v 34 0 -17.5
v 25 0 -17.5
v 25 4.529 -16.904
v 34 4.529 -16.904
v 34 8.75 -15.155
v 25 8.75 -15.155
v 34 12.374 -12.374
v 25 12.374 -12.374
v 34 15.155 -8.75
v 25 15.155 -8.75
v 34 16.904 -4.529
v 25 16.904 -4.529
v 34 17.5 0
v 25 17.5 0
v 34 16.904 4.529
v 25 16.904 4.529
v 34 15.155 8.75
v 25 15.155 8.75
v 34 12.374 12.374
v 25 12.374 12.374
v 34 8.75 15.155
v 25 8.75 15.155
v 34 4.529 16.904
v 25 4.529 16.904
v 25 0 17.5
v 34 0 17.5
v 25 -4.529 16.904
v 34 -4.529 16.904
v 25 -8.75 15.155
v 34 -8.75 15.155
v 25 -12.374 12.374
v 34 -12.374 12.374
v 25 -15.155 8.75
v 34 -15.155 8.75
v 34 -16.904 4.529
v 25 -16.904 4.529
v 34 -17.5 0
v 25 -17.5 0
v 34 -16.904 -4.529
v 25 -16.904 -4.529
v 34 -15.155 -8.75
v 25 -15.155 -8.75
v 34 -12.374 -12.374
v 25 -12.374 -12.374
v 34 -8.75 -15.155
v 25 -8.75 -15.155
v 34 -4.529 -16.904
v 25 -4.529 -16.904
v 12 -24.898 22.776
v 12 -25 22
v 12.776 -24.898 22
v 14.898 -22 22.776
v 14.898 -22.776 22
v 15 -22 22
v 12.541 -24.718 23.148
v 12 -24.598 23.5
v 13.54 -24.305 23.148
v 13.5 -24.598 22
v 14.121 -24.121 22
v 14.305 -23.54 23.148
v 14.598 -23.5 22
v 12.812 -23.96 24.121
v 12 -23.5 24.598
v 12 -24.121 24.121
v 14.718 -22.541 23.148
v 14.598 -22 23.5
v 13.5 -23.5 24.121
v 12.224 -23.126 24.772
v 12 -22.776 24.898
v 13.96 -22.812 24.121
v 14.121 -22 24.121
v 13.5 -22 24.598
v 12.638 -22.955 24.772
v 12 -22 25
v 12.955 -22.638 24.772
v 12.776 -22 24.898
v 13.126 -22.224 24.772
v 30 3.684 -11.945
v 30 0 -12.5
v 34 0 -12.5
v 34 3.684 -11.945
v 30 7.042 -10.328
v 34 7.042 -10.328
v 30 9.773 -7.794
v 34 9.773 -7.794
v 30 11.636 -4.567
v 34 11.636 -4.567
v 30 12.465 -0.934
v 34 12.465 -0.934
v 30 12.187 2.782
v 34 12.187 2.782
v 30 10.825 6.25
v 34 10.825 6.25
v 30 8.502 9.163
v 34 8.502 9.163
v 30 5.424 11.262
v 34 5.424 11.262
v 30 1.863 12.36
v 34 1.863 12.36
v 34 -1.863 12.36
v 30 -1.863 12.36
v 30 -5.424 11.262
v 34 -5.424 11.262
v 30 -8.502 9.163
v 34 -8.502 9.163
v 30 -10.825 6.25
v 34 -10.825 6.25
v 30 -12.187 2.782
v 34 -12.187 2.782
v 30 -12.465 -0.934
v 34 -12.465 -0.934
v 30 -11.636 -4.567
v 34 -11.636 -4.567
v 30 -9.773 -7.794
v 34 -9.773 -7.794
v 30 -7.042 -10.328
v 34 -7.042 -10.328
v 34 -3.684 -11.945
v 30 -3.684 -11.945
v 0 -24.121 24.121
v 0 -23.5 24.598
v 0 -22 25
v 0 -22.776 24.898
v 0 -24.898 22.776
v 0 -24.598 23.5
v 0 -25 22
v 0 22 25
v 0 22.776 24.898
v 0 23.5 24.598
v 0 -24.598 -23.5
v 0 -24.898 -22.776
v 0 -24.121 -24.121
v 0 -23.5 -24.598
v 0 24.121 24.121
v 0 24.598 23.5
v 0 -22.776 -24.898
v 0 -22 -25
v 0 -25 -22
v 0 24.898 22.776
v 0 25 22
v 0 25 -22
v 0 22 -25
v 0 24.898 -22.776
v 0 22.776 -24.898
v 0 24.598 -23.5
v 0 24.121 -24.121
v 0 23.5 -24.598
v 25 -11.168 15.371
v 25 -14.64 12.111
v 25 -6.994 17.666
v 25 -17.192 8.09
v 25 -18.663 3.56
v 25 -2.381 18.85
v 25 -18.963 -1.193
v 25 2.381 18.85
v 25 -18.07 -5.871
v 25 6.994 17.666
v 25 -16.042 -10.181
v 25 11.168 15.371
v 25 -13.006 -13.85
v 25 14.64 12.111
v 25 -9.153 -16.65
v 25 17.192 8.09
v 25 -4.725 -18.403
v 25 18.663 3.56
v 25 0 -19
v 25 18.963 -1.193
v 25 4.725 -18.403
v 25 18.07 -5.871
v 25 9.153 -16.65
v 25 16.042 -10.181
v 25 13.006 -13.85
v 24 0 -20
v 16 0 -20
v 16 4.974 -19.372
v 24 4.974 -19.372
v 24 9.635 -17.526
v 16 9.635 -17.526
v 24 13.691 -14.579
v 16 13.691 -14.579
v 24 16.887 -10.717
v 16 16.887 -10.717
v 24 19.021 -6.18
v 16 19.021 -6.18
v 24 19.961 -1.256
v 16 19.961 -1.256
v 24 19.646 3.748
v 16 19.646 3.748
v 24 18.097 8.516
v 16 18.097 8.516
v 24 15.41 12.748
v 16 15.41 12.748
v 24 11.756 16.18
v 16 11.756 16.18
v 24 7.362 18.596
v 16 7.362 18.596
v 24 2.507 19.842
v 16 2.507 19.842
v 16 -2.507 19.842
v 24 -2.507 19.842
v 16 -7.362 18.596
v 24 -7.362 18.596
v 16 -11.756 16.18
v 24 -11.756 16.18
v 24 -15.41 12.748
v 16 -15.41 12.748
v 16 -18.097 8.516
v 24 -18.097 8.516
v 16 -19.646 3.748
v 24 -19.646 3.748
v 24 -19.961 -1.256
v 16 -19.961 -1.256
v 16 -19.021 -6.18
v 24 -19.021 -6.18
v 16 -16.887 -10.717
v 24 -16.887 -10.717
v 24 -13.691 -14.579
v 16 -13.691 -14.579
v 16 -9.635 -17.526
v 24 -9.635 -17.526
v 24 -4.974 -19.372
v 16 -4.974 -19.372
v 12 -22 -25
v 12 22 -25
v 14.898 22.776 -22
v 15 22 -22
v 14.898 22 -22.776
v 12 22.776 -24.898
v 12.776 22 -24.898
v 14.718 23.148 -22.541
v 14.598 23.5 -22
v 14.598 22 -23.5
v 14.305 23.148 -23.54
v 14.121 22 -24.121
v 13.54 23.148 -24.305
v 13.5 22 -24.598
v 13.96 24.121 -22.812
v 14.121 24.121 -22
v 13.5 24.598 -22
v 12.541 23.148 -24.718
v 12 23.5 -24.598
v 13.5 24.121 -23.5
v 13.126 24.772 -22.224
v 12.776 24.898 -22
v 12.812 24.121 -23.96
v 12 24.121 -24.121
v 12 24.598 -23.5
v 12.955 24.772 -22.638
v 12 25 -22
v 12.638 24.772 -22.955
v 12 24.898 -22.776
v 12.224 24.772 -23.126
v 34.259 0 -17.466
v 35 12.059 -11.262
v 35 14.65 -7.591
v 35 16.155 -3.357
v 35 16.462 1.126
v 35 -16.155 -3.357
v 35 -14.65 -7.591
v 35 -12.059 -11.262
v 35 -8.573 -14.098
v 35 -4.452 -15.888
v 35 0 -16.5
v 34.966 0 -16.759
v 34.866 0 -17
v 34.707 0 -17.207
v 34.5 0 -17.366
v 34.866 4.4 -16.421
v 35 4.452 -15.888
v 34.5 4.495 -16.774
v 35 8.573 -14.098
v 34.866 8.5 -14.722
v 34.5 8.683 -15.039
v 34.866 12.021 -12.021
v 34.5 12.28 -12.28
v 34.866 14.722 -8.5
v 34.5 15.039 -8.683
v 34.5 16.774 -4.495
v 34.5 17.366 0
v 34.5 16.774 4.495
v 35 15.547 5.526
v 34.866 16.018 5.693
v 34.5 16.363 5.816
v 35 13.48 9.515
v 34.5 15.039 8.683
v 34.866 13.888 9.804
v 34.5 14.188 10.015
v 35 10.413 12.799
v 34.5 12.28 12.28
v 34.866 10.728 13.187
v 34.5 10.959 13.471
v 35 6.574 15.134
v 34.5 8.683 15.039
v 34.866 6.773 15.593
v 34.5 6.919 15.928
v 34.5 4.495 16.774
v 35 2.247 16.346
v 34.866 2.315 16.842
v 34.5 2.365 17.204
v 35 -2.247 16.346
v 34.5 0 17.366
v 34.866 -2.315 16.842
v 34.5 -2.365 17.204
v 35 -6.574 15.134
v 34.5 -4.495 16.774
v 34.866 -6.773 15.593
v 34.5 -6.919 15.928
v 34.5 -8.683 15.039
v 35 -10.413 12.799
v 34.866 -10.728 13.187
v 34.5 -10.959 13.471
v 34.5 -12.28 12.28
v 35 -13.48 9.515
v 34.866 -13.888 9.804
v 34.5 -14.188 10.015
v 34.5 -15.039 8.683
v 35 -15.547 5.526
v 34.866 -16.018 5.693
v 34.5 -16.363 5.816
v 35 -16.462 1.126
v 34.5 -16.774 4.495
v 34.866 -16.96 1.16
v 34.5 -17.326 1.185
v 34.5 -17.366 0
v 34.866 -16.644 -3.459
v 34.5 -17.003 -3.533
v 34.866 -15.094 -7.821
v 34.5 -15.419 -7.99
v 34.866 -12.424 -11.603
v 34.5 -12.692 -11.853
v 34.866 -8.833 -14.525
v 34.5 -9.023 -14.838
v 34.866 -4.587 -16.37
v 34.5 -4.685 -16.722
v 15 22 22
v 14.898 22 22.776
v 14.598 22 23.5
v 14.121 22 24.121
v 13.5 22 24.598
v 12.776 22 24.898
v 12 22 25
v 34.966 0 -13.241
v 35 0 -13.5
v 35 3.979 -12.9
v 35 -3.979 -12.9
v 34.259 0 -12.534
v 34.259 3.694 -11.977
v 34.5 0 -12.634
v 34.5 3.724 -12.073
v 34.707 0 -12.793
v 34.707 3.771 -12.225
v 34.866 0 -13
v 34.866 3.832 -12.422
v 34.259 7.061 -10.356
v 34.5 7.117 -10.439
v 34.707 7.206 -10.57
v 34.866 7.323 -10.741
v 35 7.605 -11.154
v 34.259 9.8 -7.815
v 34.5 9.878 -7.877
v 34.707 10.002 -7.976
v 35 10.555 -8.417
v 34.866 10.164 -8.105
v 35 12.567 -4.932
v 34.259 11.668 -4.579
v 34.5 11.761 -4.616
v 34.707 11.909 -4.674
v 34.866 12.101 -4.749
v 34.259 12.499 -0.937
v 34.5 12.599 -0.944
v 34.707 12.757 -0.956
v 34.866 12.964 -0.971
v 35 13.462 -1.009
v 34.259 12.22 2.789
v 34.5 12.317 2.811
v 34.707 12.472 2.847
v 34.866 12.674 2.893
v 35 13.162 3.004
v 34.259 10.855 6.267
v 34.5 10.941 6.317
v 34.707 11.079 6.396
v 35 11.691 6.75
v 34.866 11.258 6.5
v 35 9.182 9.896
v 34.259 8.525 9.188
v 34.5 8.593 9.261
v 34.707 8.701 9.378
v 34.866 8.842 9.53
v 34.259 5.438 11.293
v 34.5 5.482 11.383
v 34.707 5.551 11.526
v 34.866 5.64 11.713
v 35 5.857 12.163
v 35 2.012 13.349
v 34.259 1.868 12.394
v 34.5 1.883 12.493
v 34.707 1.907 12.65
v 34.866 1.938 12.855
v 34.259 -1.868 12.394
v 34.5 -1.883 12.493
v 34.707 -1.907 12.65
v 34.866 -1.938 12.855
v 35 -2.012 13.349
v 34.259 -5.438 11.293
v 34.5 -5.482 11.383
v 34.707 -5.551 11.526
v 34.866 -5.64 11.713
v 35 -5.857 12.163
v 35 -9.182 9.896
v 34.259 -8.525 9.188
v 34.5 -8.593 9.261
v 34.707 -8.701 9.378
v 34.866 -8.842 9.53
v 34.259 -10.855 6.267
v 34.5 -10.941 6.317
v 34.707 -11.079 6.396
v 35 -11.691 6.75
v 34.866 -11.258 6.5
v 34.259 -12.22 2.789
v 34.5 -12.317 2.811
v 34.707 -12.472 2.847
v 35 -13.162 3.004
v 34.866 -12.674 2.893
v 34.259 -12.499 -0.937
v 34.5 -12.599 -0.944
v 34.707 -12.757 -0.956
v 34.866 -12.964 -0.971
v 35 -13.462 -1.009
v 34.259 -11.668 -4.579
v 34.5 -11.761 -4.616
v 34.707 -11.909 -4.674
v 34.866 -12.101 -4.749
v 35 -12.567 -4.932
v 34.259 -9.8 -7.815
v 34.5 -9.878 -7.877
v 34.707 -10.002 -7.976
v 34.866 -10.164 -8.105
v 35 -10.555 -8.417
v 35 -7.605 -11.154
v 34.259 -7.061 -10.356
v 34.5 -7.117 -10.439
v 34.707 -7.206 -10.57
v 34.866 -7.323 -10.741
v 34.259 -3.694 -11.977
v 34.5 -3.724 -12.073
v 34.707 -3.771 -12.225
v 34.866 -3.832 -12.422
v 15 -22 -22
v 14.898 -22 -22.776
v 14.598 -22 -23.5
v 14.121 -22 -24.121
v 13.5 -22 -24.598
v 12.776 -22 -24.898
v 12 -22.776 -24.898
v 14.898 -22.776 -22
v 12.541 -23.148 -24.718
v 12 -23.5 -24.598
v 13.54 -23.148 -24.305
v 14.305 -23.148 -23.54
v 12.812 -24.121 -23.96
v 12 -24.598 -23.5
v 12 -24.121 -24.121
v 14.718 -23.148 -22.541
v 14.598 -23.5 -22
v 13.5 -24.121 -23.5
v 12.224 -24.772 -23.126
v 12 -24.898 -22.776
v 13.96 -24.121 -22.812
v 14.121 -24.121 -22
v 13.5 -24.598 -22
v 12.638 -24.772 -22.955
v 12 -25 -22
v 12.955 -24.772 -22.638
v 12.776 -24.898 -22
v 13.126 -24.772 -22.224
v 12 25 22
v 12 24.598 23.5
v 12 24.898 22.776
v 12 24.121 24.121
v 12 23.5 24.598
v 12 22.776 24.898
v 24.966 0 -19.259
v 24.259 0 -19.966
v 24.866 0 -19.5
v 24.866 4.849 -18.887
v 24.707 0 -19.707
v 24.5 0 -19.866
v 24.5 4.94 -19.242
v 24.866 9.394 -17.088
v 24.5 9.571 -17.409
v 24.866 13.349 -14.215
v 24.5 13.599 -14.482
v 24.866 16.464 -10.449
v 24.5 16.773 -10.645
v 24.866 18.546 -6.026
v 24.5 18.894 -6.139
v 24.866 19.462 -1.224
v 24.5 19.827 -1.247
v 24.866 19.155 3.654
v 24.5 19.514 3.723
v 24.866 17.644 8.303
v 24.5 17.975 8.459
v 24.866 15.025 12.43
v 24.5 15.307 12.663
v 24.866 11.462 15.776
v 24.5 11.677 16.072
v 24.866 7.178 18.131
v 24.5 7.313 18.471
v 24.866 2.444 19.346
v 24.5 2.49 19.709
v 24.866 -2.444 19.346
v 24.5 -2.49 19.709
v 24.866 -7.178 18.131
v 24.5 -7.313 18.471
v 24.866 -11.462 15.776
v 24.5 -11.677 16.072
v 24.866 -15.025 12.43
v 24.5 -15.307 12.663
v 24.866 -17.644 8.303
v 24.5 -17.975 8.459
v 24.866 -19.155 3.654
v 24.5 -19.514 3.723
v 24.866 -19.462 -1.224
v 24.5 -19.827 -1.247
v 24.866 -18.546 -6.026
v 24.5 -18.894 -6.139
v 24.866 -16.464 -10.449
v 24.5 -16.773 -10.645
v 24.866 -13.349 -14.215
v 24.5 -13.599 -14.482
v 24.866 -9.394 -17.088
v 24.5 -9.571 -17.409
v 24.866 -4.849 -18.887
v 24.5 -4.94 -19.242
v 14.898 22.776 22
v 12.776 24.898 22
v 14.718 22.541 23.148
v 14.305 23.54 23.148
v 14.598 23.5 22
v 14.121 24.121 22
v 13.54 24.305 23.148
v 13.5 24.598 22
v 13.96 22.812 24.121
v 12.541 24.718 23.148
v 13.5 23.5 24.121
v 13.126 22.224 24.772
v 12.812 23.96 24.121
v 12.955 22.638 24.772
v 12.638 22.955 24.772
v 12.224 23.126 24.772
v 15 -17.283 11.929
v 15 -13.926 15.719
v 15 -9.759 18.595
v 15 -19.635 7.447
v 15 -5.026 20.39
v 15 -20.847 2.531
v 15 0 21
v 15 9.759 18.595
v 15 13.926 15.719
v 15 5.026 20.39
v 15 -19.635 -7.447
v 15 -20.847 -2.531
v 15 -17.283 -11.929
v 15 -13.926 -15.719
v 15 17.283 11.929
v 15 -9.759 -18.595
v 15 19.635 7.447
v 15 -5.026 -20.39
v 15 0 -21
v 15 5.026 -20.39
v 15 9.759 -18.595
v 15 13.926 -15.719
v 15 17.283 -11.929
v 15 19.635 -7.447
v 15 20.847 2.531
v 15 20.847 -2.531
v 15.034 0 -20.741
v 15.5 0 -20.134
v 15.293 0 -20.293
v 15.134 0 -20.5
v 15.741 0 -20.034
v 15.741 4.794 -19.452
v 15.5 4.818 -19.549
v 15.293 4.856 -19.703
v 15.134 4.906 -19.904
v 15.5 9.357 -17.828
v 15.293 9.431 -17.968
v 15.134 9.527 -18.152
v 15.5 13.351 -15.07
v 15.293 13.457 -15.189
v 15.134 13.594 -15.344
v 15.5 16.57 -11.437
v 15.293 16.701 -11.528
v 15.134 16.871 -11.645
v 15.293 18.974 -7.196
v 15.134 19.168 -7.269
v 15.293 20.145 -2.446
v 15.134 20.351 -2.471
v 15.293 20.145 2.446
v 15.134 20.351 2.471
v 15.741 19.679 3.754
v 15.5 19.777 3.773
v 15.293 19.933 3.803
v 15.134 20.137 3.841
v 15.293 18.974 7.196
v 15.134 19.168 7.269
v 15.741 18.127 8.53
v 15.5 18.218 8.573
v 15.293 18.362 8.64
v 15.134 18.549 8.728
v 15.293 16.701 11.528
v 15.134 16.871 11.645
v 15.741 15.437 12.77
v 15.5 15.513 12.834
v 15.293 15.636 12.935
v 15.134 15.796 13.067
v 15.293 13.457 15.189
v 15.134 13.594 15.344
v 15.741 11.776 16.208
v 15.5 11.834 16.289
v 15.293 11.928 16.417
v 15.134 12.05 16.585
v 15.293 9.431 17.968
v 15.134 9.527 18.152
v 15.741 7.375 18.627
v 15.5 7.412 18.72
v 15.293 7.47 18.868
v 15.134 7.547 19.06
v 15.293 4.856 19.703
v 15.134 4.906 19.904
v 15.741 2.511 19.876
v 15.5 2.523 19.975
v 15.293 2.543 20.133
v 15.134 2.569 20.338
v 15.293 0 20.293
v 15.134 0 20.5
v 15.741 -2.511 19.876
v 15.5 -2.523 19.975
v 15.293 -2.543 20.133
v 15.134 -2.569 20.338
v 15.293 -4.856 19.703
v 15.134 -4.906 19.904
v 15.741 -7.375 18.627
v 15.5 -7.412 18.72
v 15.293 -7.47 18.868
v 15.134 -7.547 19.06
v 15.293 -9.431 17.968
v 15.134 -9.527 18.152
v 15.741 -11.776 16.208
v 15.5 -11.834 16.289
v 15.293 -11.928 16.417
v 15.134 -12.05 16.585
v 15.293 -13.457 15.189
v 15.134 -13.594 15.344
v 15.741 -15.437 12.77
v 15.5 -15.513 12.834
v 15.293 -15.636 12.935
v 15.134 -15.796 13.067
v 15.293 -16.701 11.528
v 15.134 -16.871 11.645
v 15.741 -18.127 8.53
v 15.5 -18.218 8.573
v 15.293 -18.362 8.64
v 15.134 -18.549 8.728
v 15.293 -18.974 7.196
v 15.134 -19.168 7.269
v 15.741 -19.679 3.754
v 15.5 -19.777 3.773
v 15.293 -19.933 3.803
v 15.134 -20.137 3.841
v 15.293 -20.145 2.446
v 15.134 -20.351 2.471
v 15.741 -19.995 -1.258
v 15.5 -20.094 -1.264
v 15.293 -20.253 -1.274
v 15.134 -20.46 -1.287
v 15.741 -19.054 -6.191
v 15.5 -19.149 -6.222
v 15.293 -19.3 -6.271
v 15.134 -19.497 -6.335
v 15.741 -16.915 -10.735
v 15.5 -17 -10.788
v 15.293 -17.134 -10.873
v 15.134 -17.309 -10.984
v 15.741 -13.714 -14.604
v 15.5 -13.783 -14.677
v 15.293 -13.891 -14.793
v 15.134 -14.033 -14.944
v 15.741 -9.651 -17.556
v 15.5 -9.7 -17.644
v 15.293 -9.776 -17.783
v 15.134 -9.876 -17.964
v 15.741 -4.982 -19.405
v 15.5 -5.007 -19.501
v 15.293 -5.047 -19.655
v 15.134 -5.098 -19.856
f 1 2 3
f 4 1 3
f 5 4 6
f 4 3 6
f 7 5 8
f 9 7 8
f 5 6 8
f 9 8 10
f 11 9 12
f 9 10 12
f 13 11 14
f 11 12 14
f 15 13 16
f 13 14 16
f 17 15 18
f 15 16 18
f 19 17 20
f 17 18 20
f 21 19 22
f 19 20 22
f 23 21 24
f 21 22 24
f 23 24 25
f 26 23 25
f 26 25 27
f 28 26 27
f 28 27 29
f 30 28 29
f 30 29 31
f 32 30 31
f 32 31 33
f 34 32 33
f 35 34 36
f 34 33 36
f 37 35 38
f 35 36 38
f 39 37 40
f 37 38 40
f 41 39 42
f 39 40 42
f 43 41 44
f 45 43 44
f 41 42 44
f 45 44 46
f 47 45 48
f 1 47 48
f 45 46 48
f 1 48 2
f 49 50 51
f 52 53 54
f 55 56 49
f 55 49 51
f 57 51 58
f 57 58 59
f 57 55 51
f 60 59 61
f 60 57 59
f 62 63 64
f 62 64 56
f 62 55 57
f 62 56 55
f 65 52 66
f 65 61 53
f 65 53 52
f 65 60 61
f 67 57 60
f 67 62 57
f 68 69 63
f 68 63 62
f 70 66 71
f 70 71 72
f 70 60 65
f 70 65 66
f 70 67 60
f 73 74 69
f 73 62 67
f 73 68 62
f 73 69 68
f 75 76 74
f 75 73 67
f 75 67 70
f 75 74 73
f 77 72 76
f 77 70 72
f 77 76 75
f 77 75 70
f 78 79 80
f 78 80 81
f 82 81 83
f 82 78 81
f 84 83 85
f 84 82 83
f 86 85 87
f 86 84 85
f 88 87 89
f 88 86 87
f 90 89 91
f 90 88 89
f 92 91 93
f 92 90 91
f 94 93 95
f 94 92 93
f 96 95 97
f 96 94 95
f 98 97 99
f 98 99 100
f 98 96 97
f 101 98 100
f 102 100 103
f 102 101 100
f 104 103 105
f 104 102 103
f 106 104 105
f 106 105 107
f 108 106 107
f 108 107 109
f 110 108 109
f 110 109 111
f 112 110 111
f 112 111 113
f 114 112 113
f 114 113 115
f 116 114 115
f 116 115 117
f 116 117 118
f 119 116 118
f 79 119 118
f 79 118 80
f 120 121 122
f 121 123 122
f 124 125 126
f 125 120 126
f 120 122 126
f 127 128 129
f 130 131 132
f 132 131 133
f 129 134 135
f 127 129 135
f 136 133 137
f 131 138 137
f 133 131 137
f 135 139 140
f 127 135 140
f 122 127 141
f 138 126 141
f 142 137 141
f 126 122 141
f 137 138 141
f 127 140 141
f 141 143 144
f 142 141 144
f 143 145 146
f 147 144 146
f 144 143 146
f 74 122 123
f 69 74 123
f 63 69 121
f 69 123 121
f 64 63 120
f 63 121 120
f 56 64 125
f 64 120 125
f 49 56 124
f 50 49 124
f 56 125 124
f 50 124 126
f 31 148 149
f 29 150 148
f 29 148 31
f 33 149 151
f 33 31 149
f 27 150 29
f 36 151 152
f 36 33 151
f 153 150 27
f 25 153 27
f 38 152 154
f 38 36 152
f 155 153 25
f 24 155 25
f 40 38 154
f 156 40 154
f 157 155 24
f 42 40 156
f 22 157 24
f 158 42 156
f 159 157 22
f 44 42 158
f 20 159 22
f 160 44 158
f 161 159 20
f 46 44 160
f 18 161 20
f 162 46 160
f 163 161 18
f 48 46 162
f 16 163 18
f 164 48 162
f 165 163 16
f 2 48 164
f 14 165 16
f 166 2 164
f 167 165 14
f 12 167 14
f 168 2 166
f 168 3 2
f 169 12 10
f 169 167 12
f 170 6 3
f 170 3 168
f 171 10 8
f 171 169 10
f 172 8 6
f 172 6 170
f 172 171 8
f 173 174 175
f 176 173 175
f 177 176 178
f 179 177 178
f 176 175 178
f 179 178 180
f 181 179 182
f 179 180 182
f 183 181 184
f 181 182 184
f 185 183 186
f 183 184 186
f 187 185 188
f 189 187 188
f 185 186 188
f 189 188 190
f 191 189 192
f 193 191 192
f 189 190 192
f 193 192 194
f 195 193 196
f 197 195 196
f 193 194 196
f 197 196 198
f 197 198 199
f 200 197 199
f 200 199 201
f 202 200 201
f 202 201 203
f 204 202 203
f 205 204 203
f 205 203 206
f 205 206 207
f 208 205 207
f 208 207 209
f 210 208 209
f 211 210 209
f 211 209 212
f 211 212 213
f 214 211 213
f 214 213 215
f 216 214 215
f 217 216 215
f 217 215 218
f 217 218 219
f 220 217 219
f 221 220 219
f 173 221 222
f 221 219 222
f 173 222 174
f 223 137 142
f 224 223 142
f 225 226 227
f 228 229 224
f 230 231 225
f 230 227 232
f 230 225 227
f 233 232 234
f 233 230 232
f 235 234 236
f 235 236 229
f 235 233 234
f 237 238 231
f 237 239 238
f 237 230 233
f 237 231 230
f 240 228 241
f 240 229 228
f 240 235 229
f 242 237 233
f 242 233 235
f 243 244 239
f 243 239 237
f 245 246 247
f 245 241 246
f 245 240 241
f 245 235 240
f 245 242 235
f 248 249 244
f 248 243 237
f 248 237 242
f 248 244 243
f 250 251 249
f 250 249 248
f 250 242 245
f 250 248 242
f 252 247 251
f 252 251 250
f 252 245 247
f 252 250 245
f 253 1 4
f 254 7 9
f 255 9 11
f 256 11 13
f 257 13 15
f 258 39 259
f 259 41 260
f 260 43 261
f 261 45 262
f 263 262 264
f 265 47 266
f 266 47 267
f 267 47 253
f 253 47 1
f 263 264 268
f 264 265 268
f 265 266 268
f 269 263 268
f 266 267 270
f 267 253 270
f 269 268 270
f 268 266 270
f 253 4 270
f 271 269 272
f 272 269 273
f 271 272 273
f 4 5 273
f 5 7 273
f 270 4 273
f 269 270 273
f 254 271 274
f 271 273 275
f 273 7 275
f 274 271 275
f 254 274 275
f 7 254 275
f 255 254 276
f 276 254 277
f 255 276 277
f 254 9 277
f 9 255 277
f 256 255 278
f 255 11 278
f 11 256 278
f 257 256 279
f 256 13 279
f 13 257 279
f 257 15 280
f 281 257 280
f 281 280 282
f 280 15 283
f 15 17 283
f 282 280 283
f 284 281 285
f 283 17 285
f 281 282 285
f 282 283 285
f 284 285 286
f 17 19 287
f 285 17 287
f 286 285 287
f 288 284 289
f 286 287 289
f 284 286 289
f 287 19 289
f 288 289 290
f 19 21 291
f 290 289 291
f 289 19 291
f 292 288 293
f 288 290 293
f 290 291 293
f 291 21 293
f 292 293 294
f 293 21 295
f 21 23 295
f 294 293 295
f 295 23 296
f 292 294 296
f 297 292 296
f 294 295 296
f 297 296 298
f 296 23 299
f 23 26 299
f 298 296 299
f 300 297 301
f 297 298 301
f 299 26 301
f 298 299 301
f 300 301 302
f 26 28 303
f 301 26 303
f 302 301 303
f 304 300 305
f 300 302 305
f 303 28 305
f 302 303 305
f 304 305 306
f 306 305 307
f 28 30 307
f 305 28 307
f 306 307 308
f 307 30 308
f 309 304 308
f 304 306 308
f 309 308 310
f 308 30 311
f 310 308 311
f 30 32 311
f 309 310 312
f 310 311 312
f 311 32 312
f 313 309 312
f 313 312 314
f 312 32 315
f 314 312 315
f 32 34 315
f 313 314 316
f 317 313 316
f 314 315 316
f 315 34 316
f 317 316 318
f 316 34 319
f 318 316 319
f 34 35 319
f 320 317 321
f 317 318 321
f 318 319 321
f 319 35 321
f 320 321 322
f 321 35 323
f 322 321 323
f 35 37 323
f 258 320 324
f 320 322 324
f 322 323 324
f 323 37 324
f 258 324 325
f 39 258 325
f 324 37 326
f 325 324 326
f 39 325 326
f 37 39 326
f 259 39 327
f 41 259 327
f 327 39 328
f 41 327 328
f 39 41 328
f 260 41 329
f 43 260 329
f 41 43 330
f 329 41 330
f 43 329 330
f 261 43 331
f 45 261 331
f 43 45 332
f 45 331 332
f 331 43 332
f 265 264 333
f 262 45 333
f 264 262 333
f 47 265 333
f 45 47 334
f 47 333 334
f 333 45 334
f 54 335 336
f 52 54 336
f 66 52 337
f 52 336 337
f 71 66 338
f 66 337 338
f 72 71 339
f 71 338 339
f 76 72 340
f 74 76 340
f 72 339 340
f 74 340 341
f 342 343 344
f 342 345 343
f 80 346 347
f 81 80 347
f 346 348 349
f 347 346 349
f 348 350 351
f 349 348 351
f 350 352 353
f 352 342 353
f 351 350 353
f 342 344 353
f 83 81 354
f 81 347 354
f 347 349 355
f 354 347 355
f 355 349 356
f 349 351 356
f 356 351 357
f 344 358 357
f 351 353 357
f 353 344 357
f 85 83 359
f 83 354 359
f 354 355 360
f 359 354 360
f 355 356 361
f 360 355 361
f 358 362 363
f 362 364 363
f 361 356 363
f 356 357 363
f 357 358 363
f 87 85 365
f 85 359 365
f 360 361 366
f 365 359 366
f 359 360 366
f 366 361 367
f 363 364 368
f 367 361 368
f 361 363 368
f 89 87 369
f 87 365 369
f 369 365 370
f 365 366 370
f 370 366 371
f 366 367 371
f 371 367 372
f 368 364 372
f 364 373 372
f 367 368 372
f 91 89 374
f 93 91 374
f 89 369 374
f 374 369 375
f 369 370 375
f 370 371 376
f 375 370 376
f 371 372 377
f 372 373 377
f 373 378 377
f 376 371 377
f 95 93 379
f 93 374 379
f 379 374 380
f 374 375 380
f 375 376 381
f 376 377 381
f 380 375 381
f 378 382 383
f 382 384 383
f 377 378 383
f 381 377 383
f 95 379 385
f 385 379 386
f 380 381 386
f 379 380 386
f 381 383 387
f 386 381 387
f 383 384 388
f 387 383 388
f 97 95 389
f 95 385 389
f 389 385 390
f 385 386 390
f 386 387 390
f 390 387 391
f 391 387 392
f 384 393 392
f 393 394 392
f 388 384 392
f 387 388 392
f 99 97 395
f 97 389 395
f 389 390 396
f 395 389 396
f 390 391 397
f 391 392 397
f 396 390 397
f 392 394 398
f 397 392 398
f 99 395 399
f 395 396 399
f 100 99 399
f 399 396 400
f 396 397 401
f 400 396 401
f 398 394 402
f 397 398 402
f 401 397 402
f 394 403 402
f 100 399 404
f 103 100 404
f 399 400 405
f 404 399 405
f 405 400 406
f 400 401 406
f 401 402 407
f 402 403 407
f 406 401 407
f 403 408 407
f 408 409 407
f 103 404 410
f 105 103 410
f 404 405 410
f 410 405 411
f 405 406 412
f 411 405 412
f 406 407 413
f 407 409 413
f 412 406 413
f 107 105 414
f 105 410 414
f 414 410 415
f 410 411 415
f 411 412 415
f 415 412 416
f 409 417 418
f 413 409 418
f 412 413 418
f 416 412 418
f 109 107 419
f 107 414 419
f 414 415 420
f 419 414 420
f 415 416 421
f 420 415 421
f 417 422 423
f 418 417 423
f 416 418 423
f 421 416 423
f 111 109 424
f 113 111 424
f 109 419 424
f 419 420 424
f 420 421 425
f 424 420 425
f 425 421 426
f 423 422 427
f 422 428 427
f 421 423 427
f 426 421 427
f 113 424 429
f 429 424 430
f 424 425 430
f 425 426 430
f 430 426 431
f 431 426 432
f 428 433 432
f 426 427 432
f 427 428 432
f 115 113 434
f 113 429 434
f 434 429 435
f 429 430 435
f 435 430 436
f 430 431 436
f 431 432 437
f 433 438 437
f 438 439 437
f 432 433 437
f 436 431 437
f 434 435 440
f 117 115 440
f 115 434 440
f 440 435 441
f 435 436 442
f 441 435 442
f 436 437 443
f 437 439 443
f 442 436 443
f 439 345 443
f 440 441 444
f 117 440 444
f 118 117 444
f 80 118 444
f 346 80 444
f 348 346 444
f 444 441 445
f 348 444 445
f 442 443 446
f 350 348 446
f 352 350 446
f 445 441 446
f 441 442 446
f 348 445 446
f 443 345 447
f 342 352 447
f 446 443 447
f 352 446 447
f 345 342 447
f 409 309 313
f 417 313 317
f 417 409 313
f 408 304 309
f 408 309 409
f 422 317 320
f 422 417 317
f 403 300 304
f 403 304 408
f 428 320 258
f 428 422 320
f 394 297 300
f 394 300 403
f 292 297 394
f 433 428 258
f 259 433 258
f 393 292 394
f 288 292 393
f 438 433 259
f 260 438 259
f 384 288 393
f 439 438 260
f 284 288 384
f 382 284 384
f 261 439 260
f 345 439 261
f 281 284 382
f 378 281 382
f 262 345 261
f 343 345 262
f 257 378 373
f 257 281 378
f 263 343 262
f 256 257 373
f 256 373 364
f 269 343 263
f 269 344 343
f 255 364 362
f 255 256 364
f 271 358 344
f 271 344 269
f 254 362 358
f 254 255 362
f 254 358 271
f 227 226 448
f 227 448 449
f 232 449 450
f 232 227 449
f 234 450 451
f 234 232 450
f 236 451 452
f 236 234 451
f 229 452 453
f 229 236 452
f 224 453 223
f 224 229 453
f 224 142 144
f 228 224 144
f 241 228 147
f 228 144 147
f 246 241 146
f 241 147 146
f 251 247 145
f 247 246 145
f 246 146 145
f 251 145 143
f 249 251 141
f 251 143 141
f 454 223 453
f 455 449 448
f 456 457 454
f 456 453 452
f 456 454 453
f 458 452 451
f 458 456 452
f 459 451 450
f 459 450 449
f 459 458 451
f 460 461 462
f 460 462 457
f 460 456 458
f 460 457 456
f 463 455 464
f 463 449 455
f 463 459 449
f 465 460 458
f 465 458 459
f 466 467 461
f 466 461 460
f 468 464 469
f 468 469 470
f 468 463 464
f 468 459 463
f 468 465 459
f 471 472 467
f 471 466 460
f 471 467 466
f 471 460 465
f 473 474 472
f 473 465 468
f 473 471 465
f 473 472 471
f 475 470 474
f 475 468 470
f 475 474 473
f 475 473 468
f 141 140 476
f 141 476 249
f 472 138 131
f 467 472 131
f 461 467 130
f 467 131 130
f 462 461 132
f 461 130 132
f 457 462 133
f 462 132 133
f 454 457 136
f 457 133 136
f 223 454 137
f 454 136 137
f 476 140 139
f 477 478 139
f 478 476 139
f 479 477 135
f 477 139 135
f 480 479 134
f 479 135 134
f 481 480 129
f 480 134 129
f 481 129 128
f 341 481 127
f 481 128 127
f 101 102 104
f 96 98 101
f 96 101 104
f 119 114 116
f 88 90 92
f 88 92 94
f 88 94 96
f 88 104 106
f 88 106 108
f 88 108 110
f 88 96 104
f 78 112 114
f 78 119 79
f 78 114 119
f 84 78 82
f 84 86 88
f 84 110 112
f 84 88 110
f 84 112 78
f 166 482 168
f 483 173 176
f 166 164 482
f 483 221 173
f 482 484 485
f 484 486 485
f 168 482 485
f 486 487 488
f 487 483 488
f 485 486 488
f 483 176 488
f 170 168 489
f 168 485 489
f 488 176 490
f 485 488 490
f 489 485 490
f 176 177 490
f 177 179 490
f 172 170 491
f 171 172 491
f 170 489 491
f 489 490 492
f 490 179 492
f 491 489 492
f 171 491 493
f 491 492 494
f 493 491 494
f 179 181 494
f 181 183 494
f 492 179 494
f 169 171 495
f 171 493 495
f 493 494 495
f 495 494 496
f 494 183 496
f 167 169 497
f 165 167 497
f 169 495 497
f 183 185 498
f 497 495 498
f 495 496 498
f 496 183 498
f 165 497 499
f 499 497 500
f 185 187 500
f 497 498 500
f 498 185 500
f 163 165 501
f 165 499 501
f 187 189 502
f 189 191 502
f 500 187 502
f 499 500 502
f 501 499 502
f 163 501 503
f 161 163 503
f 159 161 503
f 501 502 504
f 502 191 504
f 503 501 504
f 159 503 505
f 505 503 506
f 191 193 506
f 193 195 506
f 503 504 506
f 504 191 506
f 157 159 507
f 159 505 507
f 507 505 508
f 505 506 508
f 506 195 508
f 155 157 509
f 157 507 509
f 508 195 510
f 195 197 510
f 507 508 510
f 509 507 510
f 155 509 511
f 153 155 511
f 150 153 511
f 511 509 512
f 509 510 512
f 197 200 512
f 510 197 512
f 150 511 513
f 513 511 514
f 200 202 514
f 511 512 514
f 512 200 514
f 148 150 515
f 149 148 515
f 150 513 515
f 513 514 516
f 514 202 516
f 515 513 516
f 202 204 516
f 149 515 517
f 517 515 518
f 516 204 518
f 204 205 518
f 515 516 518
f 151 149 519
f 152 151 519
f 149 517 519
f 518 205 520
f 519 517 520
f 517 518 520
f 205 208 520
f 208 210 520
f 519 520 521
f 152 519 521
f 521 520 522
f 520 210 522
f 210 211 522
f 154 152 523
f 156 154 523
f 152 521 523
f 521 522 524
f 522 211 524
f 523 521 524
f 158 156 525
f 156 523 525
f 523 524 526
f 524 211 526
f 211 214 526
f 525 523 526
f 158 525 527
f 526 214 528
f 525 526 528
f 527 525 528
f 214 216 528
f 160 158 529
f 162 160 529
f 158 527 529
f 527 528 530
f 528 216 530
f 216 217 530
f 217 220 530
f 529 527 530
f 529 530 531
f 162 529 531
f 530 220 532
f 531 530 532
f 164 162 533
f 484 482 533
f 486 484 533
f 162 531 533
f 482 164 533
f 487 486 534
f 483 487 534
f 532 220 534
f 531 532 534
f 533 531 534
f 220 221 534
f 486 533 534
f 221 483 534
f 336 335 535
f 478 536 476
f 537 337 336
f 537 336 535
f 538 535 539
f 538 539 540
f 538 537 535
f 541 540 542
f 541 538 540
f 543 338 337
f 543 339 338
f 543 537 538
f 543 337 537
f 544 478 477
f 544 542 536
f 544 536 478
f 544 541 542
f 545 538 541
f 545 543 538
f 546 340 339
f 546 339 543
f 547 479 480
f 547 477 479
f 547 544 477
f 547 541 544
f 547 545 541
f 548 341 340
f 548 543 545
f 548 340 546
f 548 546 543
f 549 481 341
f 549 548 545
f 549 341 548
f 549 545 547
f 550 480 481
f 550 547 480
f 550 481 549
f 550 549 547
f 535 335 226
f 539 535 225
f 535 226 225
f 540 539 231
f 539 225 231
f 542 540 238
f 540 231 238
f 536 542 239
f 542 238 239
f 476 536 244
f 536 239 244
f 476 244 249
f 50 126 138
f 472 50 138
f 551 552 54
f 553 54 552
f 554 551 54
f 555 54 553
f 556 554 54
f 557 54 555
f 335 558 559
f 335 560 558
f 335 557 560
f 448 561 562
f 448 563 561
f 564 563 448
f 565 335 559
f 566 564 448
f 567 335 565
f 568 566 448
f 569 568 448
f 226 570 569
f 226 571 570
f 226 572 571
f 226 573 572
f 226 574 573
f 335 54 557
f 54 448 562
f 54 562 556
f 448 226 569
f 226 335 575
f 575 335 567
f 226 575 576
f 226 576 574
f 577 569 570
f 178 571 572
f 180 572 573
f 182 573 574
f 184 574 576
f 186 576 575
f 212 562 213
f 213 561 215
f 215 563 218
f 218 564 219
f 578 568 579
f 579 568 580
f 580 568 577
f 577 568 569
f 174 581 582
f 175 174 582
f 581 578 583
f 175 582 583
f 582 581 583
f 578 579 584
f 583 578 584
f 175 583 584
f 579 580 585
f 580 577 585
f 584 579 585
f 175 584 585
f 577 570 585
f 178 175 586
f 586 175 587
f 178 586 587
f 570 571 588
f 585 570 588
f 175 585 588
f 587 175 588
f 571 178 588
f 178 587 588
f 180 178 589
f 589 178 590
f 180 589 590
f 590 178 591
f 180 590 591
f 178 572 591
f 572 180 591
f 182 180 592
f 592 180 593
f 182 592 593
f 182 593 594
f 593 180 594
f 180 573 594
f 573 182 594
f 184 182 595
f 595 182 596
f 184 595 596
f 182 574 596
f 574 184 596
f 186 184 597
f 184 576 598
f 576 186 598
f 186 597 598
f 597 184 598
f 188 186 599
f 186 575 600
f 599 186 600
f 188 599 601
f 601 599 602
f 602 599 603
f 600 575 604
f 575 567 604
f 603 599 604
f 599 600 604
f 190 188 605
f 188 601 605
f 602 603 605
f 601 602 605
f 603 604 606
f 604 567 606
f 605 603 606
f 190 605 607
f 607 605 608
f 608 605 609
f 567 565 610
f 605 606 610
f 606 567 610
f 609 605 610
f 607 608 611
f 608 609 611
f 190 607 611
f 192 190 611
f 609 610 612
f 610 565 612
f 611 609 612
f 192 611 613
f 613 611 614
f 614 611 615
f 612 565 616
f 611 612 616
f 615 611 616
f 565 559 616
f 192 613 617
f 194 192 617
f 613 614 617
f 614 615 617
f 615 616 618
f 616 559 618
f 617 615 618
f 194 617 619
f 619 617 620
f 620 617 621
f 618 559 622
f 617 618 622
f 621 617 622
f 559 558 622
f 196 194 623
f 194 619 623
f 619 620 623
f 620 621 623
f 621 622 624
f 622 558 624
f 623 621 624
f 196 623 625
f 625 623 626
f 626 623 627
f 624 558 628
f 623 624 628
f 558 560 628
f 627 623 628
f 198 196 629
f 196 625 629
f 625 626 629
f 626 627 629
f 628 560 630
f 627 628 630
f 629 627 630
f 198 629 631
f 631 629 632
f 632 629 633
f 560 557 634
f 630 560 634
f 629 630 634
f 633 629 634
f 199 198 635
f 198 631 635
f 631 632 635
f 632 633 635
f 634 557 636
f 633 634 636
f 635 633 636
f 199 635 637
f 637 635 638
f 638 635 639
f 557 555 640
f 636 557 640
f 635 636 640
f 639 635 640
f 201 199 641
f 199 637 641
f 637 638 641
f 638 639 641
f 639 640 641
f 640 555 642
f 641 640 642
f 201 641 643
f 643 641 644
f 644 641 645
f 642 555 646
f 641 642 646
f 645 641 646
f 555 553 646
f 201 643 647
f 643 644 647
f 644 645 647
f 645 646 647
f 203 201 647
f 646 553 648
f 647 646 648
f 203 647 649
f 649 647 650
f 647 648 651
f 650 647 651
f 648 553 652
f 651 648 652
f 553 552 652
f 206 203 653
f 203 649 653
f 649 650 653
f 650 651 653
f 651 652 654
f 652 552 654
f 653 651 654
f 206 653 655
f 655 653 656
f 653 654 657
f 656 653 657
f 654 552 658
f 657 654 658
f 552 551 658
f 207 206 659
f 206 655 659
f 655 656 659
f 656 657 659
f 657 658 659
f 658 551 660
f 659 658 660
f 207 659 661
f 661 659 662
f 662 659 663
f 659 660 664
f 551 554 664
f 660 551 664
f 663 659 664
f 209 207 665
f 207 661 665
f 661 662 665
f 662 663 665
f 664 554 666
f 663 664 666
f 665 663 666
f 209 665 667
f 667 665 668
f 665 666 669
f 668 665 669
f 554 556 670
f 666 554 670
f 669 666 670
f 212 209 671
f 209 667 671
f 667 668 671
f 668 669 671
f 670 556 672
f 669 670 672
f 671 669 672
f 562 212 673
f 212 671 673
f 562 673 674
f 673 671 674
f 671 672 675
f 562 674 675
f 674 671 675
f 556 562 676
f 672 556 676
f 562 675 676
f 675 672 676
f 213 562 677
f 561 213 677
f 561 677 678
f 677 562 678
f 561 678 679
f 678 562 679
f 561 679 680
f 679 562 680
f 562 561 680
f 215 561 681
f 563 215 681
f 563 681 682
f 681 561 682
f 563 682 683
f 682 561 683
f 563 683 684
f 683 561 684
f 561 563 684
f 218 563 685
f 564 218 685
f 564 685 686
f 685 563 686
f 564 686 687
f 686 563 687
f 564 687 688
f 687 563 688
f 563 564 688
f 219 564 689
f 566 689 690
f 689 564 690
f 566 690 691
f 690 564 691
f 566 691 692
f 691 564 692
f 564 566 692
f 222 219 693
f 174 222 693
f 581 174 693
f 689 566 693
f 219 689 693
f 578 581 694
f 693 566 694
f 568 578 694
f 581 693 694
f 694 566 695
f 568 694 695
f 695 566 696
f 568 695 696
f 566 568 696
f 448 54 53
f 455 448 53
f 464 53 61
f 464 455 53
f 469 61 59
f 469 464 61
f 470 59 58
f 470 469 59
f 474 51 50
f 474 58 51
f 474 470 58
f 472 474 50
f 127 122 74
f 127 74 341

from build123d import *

# Parameters (mm, degrees)
SKETCH1_W           = 50
SKETCH1_H           = 50
BOSS_EXTRUDE1_DEPTH = 15
SKETCH2_R           = 20
BOSS_EXTRUDE2_DEPTH = 20
CUT_EXTRUDE1_START  = -10
SKETCH3_R           = 20
SKETCH3_R_2         = 17.5
SKETCH3_R_3         = 12.5
CUT_EXTRUDE1_DEPTH  = 10
SKETCH4_R           = 12.5
BOSS_EXTRUDE3_DEPTH = 5
FILLET1_R           = 1
FILLET2_R           = 3
FILLET3_R           = 3


with BuildPart() as part:
    # Sketch1 → Boss-Extrude1 (new body)
    with BuildSketch(Plane(origin=(0, 0, 0), x_dir=(0, 0, -1), z_dir=(1, 0, 0))):
        Rectangle(SKETCH1_W, SKETCH1_H)
    extrude(amount=BOSS_EXTRUDE1_DEPTH)

    # Sketch2 → Boss-Extrude2 (add)
    with BuildSketch(Plane(origin=(15, 0, 0), x_dir=(0, 0, -1), z_dir=(1, 0, 0))):
        Circle(SKETCH2_R)
    extrude(amount=BOSS_EXTRUDE2_DEPTH)

    # Sketch3 → Cut-Extrude1 (cut)
    # profile 1 of 2: a face of its own
    with BuildSketch(Plane(origin=(35, 0, 0), x_dir=(0, 0, -1), z_dir=(1, 0, 0)).offset(CUT_EXTRUDE1_START)):
        Circle(SKETCH3_R)
        Circle(SKETCH3_R_2, mode=Mode.SUBTRACT)
    # profile 2 of 2: a face of its own
    with BuildSketch(Plane(origin=(35, 0, 0), x_dir=(0, 0, -1), z_dir=(1, 0, 0)).offset(CUT_EXTRUDE1_START)):
        Circle(SKETCH3_R_3)
    extrude(amount=CUT_EXTRUDE1_DEPTH, mode=Mode.SUBTRACT)

    # Sketch4 → Boss-Extrude3 (add)
    with BuildSketch(Plane(origin=(25, 0, 0), x_dir=(0, 0, -1), z_dir=(1, 0, 0))):
        Circle(SKETCH4_R)
    extrude(amount=BOSS_EXTRUDE3_DEPTH)

    # Fillet1
    fillet1_edges = [part.edges().sort_by_distance(p)[0] for p in [
        (15, 0, 20),
        (35, 0, 12.5),
        (35, 0, 17.5),
        (25, 0, 20),
    ]]
    fillet(fillet1_edges, radius=FILLET1_R)

    # Fillet2
    fillet2_edges = [part.edges().sort_by_distance(p)[0] for p in [
        (15, 0, 25),
        (15, -25, 0),
        (15, 0, -25),
        (15, 25, 0),
    ]]
    fillet(fillet2_edges, radius=FILLET2_R)

    # Fillet3
    # the kernel refuses this fillet: 3 mm, written as the material it takes off along each edge
    with BuildSketch(Plane(origin=(12, 22, 22), x_dir=(0, 1, 0), z_dir=(0, 0, 1))) as fillet3_piece_1_section:
        Polygon((0, 0), (FILLET3_R, 0), (FILLET3_R, -FILLET3_R), (0, -FILLET3_R), align=None)
    fillet3_piece_1 = extrude(amount=FILLET3_R, mode=Mode.PRIVATE)
    fillet3_piece_1 = fillet3_piece_1 - Plane(origin=(12, 22, 22), x_dir=(-0.7071067811865475, -0.7071067811865475, 0), z_dir=(0, 0, 1)) * Sphere(FILLET3_R, mode=Mode.PRIVATE)
    add(fillet3_piece_1, mode=Mode.SUBTRACT)
    with BuildSketch(Plane(origin=(12, 22, -22), x_dir=(0, 0, -1), z_dir=(0, 1, 0))) as fillet3_piece_2_section:
        Polygon((0, 0), (FILLET3_R, 0), (FILLET3_R, -FILLET3_R), (0, -FILLET3_R), align=None)
    fillet3_piece_2 = extrude(amount=FILLET3_R, mode=Mode.PRIVATE)
    fillet3_piece_2 = fillet3_piece_2 - Plane(origin=(12, 22, -22), x_dir=(-0.7071067811865475, 0, 0.7071067811865475), z_dir=(0, 1, 0)) * Sphere(FILLET3_R, mode=Mode.PRIVATE)
    add(fillet3_piece_2, mode=Mode.SUBTRACT)
    with BuildSketch(Plane(origin=(12, -22, 22), x_dir=(0, -1, 0), z_dir=(0, 0, 1))) as fillet3_piece_3_section:
        Polygon((0, 0), (FILLET3_R, 0), (FILLET3_R, FILLET3_R), (0, FILLET3_R), align=None)
    fillet3_piece_3 = extrude(amount=FILLET3_R, mode=Mode.PRIVATE)
    fillet3_piece_3 = fillet3_piece_3 - Plane(origin=(12, -22, 22), x_dir=(-0.7071067811865475, 0.7071067811865475, 0), z_dir=(0, 0, 1)) * Sphere(FILLET3_R, mode=Mode.PRIVATE)
    add(fillet3_piece_3, mode=Mode.SUBTRACT)
    with BuildSketch(Plane(origin=(12, -22, -22), x_dir=(0, 0, -1), z_dir=(0, -1, 0))) as fillet3_piece_4_section:
        Polygon((0, 0), (FILLET3_R, 0), (FILLET3_R, FILLET3_R), (0, FILLET3_R), align=None)
    fillet3_piece_4 = extrude(amount=FILLET3_R, mode=Mode.PRIVATE)
    fillet3_piece_4 = fillet3_piece_4 - Plane(origin=(12, -22, -22), x_dir=(-0.7071067811865475, 0, 0.7071067811865475), z_dir=(0, -1, 0)) * Sphere(FILLET3_R, mode=Mode.PRIVATE)
    add(fillet3_piece_4, mode=Mode.SUBTRACT)
    with BuildSketch(Plane(origin=(-7.5, -25, -25), x_dir=(0, 0, 1), z_dir=(1, 0, 0)), Plane(origin=(-7.5, -25, 25), x_dir=(0, 1, 0), z_dir=(1, 0, 0))) as fillet3_piece_5:
        with BuildLine():
            CenterArc((FILLET3_R, -FILLET3_R), FILLET3_R, 90, 90)
            Line((0, -FILLET3_R), (0, 0))
            Line((0, 0), (FILLET3_R, 0))
        make_face()
    extrude(amount=19.5, mode=Mode.SUBTRACT)
    with BuildSketch(Plane(origin=(-7.5, 25, -25), x_dir=(0, 0, 1), z_dir=(1, 0, 0)), Plane(origin=(-7.5, 25, 25), x_dir=(0, -1, 0), z_dir=(1, 0, 0))) as fillet3_piece_6:
        with BuildLine():
            CenterArc((FILLET3_R, FILLET3_R), FILLET3_R, 180, 90)
            Line((0, FILLET3_R), (0, 0))
            Line((0, 0), (FILLET3_R, 0))
        make_face()
    extrude(amount=19.5, mode=Mode.SUBTRACT)


solid = part.part
